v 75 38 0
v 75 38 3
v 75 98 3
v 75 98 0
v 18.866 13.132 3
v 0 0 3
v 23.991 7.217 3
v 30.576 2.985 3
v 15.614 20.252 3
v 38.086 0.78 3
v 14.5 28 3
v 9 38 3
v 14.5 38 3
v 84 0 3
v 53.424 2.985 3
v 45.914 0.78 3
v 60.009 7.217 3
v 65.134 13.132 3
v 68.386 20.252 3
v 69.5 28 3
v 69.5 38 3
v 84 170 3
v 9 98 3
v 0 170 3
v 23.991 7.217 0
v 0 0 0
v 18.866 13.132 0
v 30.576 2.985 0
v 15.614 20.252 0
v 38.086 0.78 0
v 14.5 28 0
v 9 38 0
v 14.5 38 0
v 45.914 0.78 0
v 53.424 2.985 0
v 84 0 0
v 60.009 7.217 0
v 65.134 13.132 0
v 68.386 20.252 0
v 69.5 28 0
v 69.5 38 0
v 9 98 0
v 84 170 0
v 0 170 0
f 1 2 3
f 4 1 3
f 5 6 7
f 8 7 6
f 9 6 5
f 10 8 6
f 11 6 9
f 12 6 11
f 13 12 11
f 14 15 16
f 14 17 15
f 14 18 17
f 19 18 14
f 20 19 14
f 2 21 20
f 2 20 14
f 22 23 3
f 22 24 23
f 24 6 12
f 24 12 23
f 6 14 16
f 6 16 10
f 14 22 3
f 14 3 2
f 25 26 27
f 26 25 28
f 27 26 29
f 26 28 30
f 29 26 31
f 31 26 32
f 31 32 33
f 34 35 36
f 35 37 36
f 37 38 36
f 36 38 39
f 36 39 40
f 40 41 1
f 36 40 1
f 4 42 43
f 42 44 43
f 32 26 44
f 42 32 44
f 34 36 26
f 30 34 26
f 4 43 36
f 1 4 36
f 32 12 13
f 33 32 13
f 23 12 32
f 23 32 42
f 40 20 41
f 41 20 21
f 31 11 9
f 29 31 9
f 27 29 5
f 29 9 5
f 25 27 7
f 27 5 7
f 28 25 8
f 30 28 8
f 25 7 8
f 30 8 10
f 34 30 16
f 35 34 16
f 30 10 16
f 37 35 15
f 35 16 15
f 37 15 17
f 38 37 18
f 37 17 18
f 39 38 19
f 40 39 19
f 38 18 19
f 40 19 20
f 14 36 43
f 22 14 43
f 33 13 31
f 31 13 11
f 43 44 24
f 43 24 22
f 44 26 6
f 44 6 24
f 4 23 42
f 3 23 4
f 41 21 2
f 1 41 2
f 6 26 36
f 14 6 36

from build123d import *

# Parameters (mm, degrees)
SKETCH_1_W          = 84
SKETCH_1_H          = 170
EXTRUDE_1_DEPTH     = 3
CUT_EXTRUDE_1_DEPTH = 3


with BuildPart() as part:
    # 草图1 → 凸台-拉伸1 (new body)
    with BuildSketch(Plane.XY):
        with Locations((42, 85)):
            Rectangle(SKETCH_1_W, SKETCH_1_H)
    extrude(amount=EXTRUDE_1_DEPTH)

    # 草图2 → 切除-拉伸1 (cut)
    with BuildSketch(Plane.XY.offset(3)):
        with BuildLine():
            Line((75, 98), (9, 98))
            Line((9, 98), (9, 38))
            Line((9, 38), (14.5, 38))
            Line((14.5, 38), (14.5, 28))
            ThreePointArc((14.5, 28), (42, 0.5), (69.5, 28))
            Line((69.5, 28), (69.5, 38))
            Line((69.5, 38), (75, 38))
            Line((75, 38), (75, 98))
        make_face()
    extrude(amount=-CUT_EXTRUDE_1_DEPTH, mode=Mode.SUBTRACT)


solid = part.part
